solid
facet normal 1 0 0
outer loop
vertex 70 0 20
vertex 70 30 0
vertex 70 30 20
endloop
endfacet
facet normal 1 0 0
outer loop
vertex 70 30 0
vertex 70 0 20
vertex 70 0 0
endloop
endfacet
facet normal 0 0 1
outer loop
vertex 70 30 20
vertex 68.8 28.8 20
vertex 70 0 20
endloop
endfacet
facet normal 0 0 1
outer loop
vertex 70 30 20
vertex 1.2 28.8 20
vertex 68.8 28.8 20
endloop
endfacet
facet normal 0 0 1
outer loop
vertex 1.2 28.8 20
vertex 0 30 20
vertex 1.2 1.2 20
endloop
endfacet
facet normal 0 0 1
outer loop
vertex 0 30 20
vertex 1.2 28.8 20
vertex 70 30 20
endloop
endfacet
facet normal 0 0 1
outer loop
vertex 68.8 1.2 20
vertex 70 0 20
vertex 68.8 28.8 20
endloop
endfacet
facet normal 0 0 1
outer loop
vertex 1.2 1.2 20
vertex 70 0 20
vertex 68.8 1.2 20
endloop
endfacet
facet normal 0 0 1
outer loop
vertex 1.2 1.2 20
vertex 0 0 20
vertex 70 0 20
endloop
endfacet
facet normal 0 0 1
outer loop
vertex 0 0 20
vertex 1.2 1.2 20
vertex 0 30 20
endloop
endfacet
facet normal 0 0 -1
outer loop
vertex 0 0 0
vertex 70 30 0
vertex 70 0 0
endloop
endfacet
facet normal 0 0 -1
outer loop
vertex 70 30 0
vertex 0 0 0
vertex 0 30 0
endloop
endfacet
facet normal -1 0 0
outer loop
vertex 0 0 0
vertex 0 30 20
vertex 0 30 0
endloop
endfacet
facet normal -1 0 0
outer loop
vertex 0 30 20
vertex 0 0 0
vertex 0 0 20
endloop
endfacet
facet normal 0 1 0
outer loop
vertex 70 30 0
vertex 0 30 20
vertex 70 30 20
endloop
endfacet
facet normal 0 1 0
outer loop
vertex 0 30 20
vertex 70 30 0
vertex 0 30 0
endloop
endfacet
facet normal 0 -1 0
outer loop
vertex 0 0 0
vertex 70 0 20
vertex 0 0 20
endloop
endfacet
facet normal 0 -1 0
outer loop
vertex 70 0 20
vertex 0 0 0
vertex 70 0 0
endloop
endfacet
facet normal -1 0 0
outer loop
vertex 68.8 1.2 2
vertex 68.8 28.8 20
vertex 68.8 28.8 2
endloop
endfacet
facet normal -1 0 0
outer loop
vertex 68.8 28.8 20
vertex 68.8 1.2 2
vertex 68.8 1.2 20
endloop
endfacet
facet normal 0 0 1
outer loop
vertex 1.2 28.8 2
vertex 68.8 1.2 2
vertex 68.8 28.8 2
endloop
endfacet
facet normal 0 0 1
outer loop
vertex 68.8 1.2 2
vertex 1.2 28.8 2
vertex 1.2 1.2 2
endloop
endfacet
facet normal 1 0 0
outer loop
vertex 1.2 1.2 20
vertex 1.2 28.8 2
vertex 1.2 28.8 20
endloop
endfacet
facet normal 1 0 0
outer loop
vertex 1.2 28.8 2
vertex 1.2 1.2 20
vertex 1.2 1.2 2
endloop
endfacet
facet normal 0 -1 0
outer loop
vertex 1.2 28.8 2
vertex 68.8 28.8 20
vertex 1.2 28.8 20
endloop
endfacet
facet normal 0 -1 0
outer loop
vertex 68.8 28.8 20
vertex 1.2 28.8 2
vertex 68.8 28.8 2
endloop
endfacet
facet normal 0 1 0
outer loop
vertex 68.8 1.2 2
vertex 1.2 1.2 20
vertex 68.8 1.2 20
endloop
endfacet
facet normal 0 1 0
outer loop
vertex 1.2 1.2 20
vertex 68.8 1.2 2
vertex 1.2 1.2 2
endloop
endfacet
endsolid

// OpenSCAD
$fn = 32;

// ----------------------------------------------------------------------
// Open box: 1.2 mm walls
// ----------------------------------------------------------------------

// --- parameters (mm) ---
box_l = 70;               // outer length, X
box_w = 30;               // outer width, Y
box_h = 20;               // outer height, Z
wall = 1.2;               // wall thickness
floor = 2;                // floor thickness

difference() {
  cube([box_l, box_w, box_h]);
  translate([wall, wall, floor])
    cube([box_l - 2 * wall, box_w - 2 * wall, box_h]);
}
